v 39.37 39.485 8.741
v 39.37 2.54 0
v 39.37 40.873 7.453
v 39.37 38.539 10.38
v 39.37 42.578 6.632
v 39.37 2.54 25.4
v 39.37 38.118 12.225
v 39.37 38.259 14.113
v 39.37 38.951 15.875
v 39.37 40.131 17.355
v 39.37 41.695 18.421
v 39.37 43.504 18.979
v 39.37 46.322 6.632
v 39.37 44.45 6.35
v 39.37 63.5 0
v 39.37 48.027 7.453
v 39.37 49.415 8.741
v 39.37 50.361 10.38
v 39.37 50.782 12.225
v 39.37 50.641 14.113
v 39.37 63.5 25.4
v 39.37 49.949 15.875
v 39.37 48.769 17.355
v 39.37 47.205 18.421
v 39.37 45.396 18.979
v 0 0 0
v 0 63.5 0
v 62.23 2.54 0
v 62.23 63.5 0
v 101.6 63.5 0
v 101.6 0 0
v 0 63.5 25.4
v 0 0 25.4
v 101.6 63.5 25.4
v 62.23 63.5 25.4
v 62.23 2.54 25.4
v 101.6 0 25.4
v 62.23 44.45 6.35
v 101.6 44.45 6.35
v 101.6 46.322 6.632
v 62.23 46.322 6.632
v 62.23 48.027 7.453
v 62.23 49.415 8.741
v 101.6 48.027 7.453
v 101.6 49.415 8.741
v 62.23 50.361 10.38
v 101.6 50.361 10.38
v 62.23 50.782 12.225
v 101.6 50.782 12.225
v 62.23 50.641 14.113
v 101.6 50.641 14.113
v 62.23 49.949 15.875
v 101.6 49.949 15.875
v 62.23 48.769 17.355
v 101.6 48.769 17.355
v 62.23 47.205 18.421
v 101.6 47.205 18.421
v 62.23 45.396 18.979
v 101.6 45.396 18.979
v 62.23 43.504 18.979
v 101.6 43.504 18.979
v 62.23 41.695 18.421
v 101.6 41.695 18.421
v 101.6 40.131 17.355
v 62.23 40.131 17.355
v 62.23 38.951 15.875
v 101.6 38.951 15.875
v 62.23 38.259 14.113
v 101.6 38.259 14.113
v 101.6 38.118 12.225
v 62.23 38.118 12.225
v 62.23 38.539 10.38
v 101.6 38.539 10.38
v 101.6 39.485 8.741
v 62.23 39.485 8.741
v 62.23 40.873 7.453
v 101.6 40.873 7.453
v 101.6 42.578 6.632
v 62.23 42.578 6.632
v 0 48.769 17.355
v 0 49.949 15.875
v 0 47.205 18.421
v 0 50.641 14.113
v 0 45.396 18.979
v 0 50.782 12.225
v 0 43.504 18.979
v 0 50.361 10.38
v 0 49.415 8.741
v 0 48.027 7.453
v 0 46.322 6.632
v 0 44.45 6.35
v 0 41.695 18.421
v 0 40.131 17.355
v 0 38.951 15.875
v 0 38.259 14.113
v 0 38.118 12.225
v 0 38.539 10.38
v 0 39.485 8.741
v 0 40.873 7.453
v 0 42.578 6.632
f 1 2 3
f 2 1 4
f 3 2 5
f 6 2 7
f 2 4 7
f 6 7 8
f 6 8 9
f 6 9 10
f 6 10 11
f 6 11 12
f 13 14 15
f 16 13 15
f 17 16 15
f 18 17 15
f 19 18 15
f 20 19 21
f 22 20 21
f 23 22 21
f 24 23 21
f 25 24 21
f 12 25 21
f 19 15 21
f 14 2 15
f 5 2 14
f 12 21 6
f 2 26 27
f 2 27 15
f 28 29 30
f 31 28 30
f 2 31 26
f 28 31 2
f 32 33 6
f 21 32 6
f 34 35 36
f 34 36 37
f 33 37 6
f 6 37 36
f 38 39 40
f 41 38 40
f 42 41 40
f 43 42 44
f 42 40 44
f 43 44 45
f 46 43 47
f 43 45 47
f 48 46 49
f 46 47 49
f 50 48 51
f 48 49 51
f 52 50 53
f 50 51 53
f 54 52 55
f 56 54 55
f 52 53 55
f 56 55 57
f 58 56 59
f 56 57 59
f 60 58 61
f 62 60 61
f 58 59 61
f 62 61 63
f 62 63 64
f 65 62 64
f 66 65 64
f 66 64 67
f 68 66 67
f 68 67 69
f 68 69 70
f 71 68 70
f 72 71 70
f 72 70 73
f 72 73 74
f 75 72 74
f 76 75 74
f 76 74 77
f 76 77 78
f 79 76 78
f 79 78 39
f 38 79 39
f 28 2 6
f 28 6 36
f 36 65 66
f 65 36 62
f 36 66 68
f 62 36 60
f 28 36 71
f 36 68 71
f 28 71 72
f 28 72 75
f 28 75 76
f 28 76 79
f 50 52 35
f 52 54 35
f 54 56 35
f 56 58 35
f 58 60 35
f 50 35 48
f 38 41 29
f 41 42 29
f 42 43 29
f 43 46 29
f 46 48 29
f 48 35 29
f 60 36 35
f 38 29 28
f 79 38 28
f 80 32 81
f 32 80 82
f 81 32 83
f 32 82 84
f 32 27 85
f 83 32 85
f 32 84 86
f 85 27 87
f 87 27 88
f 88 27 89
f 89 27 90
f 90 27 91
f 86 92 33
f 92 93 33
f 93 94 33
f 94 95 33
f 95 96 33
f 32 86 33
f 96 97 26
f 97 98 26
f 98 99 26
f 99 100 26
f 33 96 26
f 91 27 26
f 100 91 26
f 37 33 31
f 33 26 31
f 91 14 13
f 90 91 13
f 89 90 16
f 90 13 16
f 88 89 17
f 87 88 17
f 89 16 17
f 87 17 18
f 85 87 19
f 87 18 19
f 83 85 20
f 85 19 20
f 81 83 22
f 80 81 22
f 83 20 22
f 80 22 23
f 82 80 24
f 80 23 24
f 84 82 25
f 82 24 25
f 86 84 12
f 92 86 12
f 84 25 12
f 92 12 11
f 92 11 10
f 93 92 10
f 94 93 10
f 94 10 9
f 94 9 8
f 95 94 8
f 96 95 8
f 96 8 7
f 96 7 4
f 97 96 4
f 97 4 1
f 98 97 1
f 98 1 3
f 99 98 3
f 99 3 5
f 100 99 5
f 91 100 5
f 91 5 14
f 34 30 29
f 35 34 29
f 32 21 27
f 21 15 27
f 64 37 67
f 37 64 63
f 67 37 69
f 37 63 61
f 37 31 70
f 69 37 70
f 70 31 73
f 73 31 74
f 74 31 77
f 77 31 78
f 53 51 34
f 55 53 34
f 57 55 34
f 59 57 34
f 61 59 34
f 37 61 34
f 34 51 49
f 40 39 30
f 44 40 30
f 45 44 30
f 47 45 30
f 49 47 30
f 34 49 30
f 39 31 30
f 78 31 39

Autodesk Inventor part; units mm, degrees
ref_plane "YZ Plane" through (0, 0, 0) normal (1, 0, 0) x (0, 1, 0)
ref_plane "XZ Plane" through (0, 0, 0) normal (0, 1, 0) x (-1, 0, 0)
ref_plane "XY Plane" through (0, 0, 0) normal (0, 0, 1) x (1, 0, 0)
sketch "Sketch1" plane through (0, 0, 0) normal (0, 0, 1) x (1, 0, 0)
  line L0 (0, 0) -> (101.6, 0)
  line L1 (101.6, 0) -> (101.6, 63.5)
  line L2 (101.6, 63.5) -> (0, 63.5)
  line L3 (0, 63.5) -> (0, 0)
  dimension "d0" = 101.6
  dimension "d1" = 63.5
extrude "Extrusion1" add sketch "Sketch1" along normal blind 25.4
sketch "Sketch2" plane through (101.6, 0, 0) normal (1, 0, 0) x (0, 0, -1)
  circle A0 centre (-12.7, 44.45) radius 6.35
  line L0 (-25.4, 0) -> (-25.4, 63.5) projected
  line L1 (0, 0) -> (-25.4, 0) projected
  line L2 (0, 63.5) -> (-25.4, 63.5) projected
  dimension "d4" = 12.7
  dimension "d5" = 12.7
  dimension "d13" = 19.05
extrude "Extrusion2" cut sketch "Sketch2" against normal blind 101.6
sketch "Sketch3" plane through (0, 63.5, 0) normal (0, 1, 0) x (1, 0, 0)
  line L0 (0, -25.4) -> (101.6, -25.4) projected
  line L1 (0, 0) -> (101.6, 0) projected
  line L2 (39.37, -25.4) -> (62.23, -25.4)
  line L3 (62.23, -25.4) -> (62.23, 0)
  line L4 (62.23, 0) -> (39.37, 0)
  line L5 (39.37, 0) -> (39.37, -25.4)
  line L6 (101.6, 0) -> (101.6, -25.4) projected
  dimension "d9" = 22.86
  dimension "d10" = 39.37
extrude "Extrusion3" cut sketch "Sketch3" against normal blind 60.96 contours L5 L1 L3 L0
properties part number "Kermit MountConnectors"
